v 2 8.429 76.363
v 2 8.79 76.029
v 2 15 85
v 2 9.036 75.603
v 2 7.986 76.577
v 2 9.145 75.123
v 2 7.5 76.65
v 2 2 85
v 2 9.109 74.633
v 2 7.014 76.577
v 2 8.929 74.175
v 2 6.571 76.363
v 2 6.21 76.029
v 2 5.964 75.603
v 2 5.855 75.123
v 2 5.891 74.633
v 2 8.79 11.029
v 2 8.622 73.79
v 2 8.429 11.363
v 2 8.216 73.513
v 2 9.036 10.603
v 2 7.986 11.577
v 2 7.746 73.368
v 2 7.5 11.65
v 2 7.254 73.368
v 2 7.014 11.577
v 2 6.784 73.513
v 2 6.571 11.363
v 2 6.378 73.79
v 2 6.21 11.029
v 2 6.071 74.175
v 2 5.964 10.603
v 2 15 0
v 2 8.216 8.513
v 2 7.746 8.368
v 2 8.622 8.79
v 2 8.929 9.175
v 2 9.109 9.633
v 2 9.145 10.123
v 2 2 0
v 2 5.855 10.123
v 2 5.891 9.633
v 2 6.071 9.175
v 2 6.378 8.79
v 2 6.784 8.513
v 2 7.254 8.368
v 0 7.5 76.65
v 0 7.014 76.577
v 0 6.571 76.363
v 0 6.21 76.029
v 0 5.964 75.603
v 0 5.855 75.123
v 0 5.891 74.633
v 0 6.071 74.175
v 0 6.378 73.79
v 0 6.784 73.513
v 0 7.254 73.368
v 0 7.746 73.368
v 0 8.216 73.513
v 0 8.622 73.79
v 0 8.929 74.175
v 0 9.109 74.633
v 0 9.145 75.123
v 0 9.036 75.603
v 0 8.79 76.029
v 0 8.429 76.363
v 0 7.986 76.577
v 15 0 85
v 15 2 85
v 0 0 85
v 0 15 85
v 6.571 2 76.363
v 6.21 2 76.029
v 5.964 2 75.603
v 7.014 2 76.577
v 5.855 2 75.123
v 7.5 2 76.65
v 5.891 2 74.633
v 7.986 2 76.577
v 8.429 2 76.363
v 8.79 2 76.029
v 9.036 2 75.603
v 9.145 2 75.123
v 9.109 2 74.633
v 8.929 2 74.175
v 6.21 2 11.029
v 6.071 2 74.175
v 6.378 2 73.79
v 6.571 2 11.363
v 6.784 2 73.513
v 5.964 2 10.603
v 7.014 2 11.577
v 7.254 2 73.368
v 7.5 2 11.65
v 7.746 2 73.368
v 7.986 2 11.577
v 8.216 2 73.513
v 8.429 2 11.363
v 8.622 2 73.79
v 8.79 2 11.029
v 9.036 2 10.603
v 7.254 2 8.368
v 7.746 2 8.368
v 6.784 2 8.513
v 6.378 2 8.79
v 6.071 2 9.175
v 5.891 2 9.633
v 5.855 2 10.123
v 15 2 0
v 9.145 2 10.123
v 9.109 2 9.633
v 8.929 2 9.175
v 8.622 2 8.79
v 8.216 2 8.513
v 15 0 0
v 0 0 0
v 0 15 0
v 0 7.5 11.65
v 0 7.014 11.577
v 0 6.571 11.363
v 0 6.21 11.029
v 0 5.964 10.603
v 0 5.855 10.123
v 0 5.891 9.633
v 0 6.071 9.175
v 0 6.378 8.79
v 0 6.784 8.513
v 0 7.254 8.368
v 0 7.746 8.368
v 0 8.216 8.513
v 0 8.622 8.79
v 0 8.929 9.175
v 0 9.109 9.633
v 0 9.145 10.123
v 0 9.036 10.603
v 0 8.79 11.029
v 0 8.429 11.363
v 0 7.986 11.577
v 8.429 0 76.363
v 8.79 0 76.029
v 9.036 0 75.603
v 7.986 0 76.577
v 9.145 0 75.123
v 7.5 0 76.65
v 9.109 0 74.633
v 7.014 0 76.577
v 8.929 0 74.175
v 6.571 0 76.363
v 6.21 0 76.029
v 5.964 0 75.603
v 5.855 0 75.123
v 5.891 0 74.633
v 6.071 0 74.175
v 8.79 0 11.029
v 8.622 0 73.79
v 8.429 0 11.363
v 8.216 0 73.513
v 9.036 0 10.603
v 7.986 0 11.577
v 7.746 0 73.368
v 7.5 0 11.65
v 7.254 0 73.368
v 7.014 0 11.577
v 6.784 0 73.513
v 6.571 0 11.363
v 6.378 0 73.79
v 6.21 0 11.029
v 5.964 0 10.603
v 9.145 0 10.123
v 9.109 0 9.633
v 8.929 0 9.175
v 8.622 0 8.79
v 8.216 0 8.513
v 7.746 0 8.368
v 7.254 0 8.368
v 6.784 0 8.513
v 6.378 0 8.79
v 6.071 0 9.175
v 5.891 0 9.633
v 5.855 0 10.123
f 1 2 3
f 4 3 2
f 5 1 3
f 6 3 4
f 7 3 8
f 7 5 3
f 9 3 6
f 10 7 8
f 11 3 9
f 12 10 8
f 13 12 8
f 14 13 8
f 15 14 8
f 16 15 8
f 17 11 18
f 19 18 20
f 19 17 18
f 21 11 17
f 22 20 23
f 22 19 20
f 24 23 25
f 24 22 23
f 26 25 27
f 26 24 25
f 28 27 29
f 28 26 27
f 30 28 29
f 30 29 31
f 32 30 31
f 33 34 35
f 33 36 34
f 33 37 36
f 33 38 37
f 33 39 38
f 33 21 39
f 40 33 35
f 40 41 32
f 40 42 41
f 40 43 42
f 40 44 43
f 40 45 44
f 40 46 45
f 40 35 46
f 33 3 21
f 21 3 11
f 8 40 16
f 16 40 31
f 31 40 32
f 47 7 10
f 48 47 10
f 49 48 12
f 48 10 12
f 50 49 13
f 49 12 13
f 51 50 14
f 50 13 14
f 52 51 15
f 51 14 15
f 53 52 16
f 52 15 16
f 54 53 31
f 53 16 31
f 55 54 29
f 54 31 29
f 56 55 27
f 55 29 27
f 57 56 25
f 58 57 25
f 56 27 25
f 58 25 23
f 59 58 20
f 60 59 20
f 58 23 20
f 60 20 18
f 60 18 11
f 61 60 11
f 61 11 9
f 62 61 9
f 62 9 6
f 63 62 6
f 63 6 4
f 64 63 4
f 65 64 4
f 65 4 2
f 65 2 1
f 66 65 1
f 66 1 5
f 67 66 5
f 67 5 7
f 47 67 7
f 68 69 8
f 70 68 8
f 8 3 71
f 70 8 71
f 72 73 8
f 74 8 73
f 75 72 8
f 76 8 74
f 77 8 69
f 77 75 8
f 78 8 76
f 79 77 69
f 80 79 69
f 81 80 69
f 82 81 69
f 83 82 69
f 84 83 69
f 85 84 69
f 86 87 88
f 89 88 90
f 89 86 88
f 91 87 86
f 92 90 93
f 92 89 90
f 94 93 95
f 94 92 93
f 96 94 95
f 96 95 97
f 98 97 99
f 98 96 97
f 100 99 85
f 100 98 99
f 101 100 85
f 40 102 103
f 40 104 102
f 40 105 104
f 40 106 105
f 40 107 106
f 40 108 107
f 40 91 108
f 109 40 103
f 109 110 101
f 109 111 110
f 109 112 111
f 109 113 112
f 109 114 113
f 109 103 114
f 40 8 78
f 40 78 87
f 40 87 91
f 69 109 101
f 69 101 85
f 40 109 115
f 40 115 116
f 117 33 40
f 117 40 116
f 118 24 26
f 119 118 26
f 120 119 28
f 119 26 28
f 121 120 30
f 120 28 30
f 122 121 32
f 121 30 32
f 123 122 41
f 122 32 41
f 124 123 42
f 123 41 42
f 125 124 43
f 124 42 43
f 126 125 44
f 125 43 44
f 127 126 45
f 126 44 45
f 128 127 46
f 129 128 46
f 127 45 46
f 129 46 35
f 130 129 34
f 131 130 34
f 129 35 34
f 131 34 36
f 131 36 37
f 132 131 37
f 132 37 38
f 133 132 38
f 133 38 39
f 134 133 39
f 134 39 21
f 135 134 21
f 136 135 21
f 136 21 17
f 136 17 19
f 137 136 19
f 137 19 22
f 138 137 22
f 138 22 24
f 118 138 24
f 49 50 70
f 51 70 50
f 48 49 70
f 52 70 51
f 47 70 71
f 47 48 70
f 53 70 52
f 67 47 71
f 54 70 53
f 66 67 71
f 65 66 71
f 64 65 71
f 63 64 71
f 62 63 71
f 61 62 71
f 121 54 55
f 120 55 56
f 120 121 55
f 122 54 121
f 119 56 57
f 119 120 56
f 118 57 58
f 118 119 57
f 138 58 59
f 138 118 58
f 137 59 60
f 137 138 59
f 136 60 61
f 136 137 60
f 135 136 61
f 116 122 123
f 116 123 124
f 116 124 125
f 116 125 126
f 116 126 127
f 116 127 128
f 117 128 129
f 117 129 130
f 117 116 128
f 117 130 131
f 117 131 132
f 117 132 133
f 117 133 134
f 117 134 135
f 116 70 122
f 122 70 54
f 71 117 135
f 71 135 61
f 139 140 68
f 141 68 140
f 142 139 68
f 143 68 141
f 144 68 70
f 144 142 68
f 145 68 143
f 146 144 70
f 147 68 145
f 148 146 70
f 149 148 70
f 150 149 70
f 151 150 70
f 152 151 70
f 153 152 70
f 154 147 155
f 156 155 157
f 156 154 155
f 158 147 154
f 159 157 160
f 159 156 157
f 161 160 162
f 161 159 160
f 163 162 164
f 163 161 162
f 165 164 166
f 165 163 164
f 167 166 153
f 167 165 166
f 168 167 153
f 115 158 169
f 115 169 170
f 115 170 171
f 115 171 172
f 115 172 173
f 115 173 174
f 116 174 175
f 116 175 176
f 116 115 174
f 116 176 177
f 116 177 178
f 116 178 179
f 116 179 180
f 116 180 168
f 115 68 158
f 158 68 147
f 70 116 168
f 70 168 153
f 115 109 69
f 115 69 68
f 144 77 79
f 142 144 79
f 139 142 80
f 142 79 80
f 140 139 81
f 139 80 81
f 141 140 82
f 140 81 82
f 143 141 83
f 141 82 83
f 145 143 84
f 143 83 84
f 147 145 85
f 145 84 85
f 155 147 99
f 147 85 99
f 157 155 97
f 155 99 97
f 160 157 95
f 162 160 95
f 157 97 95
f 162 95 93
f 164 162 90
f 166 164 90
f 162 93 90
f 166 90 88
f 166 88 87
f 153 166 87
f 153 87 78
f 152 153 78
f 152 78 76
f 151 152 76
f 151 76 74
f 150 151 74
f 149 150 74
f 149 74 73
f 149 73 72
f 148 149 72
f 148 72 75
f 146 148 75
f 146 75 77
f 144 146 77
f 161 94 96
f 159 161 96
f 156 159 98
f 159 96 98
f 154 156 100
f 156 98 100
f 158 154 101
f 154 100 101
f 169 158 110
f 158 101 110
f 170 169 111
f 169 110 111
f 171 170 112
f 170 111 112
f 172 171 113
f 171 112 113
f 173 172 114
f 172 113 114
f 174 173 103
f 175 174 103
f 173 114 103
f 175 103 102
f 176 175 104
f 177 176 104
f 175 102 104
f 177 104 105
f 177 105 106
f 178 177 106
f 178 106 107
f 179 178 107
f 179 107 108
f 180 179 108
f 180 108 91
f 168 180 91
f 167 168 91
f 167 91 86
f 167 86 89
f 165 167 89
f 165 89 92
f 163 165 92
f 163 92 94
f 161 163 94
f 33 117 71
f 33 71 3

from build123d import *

# Parameters (mm, degrees)
EXTRUDE_1_DEPTH          = 85
M4X0_7_1_D               = 3.3
M4X0_7_1_DEPTH           = 11.5
M4X0_7_1_TIP             = 0.991420021
M4X0_7_1_ON_FACE_2_D     = 3.3
M4X0_7_1_ON_FACE_2_DEPTH = 11.5
M4X0_7_1_ON_FACE_2_TIP   = 0.991420021


with BuildPart() as part:
    # ｽｹｯﾁ1 → ﾎﾞｽ - 押し出し1 (new body)
    with BuildSketch(Plane.XY):
        Polygon((0, 0), (0, 15), (2, 15), (2, 2), (15, 2), (15, 0), align=None)
    extrude(amount=EXTRUDE_1_DEPTH)

    # M4x0.7 ねじ穴1
    with Locations(Plane(origin=(0, 7.5, 75), x_dir=(0, 0, -1), z_dir=(-1, 0, 0))):
        with Locations((0, 0), (65, 0)):
            Hole(M4X0_7_1_D / 2, depth=M4X0_7_1_DEPTH)
            with Locations((0, 0, -(M4X0_7_1_DEPTH + M4X0_7_1_TIP / 2))):  # 118° drill point
                Cone(0, M4X0_7_1_D / 2, M4X0_7_1_TIP, mode=Mode.SUBTRACT)

    # M4x0.7 ねじ穴1 on face 2
    with Locations(Plane(origin=(7.5, 0, 75), x_dir=(0, 0, -1), z_dir=(0, -1, 0))):
        with Locations((0, 0), (65, 0)):
            Hole(M4X0_7_1_ON_FACE_2_D / 2, depth=M4X0_7_1_ON_FACE_2_DEPTH)
            with Locations((0, 0, -(M4X0_7_1_ON_FACE_2_DEPTH + M4X0_7_1_ON_FACE_2_TIP / 2))):  # 118° drill point
                Cone(0, M4X0_7_1_ON_FACE_2_D / 2, M4X0_7_1_ON_FACE_2_TIP, mode=Mode.SUBTRACT)


solid = part.part
